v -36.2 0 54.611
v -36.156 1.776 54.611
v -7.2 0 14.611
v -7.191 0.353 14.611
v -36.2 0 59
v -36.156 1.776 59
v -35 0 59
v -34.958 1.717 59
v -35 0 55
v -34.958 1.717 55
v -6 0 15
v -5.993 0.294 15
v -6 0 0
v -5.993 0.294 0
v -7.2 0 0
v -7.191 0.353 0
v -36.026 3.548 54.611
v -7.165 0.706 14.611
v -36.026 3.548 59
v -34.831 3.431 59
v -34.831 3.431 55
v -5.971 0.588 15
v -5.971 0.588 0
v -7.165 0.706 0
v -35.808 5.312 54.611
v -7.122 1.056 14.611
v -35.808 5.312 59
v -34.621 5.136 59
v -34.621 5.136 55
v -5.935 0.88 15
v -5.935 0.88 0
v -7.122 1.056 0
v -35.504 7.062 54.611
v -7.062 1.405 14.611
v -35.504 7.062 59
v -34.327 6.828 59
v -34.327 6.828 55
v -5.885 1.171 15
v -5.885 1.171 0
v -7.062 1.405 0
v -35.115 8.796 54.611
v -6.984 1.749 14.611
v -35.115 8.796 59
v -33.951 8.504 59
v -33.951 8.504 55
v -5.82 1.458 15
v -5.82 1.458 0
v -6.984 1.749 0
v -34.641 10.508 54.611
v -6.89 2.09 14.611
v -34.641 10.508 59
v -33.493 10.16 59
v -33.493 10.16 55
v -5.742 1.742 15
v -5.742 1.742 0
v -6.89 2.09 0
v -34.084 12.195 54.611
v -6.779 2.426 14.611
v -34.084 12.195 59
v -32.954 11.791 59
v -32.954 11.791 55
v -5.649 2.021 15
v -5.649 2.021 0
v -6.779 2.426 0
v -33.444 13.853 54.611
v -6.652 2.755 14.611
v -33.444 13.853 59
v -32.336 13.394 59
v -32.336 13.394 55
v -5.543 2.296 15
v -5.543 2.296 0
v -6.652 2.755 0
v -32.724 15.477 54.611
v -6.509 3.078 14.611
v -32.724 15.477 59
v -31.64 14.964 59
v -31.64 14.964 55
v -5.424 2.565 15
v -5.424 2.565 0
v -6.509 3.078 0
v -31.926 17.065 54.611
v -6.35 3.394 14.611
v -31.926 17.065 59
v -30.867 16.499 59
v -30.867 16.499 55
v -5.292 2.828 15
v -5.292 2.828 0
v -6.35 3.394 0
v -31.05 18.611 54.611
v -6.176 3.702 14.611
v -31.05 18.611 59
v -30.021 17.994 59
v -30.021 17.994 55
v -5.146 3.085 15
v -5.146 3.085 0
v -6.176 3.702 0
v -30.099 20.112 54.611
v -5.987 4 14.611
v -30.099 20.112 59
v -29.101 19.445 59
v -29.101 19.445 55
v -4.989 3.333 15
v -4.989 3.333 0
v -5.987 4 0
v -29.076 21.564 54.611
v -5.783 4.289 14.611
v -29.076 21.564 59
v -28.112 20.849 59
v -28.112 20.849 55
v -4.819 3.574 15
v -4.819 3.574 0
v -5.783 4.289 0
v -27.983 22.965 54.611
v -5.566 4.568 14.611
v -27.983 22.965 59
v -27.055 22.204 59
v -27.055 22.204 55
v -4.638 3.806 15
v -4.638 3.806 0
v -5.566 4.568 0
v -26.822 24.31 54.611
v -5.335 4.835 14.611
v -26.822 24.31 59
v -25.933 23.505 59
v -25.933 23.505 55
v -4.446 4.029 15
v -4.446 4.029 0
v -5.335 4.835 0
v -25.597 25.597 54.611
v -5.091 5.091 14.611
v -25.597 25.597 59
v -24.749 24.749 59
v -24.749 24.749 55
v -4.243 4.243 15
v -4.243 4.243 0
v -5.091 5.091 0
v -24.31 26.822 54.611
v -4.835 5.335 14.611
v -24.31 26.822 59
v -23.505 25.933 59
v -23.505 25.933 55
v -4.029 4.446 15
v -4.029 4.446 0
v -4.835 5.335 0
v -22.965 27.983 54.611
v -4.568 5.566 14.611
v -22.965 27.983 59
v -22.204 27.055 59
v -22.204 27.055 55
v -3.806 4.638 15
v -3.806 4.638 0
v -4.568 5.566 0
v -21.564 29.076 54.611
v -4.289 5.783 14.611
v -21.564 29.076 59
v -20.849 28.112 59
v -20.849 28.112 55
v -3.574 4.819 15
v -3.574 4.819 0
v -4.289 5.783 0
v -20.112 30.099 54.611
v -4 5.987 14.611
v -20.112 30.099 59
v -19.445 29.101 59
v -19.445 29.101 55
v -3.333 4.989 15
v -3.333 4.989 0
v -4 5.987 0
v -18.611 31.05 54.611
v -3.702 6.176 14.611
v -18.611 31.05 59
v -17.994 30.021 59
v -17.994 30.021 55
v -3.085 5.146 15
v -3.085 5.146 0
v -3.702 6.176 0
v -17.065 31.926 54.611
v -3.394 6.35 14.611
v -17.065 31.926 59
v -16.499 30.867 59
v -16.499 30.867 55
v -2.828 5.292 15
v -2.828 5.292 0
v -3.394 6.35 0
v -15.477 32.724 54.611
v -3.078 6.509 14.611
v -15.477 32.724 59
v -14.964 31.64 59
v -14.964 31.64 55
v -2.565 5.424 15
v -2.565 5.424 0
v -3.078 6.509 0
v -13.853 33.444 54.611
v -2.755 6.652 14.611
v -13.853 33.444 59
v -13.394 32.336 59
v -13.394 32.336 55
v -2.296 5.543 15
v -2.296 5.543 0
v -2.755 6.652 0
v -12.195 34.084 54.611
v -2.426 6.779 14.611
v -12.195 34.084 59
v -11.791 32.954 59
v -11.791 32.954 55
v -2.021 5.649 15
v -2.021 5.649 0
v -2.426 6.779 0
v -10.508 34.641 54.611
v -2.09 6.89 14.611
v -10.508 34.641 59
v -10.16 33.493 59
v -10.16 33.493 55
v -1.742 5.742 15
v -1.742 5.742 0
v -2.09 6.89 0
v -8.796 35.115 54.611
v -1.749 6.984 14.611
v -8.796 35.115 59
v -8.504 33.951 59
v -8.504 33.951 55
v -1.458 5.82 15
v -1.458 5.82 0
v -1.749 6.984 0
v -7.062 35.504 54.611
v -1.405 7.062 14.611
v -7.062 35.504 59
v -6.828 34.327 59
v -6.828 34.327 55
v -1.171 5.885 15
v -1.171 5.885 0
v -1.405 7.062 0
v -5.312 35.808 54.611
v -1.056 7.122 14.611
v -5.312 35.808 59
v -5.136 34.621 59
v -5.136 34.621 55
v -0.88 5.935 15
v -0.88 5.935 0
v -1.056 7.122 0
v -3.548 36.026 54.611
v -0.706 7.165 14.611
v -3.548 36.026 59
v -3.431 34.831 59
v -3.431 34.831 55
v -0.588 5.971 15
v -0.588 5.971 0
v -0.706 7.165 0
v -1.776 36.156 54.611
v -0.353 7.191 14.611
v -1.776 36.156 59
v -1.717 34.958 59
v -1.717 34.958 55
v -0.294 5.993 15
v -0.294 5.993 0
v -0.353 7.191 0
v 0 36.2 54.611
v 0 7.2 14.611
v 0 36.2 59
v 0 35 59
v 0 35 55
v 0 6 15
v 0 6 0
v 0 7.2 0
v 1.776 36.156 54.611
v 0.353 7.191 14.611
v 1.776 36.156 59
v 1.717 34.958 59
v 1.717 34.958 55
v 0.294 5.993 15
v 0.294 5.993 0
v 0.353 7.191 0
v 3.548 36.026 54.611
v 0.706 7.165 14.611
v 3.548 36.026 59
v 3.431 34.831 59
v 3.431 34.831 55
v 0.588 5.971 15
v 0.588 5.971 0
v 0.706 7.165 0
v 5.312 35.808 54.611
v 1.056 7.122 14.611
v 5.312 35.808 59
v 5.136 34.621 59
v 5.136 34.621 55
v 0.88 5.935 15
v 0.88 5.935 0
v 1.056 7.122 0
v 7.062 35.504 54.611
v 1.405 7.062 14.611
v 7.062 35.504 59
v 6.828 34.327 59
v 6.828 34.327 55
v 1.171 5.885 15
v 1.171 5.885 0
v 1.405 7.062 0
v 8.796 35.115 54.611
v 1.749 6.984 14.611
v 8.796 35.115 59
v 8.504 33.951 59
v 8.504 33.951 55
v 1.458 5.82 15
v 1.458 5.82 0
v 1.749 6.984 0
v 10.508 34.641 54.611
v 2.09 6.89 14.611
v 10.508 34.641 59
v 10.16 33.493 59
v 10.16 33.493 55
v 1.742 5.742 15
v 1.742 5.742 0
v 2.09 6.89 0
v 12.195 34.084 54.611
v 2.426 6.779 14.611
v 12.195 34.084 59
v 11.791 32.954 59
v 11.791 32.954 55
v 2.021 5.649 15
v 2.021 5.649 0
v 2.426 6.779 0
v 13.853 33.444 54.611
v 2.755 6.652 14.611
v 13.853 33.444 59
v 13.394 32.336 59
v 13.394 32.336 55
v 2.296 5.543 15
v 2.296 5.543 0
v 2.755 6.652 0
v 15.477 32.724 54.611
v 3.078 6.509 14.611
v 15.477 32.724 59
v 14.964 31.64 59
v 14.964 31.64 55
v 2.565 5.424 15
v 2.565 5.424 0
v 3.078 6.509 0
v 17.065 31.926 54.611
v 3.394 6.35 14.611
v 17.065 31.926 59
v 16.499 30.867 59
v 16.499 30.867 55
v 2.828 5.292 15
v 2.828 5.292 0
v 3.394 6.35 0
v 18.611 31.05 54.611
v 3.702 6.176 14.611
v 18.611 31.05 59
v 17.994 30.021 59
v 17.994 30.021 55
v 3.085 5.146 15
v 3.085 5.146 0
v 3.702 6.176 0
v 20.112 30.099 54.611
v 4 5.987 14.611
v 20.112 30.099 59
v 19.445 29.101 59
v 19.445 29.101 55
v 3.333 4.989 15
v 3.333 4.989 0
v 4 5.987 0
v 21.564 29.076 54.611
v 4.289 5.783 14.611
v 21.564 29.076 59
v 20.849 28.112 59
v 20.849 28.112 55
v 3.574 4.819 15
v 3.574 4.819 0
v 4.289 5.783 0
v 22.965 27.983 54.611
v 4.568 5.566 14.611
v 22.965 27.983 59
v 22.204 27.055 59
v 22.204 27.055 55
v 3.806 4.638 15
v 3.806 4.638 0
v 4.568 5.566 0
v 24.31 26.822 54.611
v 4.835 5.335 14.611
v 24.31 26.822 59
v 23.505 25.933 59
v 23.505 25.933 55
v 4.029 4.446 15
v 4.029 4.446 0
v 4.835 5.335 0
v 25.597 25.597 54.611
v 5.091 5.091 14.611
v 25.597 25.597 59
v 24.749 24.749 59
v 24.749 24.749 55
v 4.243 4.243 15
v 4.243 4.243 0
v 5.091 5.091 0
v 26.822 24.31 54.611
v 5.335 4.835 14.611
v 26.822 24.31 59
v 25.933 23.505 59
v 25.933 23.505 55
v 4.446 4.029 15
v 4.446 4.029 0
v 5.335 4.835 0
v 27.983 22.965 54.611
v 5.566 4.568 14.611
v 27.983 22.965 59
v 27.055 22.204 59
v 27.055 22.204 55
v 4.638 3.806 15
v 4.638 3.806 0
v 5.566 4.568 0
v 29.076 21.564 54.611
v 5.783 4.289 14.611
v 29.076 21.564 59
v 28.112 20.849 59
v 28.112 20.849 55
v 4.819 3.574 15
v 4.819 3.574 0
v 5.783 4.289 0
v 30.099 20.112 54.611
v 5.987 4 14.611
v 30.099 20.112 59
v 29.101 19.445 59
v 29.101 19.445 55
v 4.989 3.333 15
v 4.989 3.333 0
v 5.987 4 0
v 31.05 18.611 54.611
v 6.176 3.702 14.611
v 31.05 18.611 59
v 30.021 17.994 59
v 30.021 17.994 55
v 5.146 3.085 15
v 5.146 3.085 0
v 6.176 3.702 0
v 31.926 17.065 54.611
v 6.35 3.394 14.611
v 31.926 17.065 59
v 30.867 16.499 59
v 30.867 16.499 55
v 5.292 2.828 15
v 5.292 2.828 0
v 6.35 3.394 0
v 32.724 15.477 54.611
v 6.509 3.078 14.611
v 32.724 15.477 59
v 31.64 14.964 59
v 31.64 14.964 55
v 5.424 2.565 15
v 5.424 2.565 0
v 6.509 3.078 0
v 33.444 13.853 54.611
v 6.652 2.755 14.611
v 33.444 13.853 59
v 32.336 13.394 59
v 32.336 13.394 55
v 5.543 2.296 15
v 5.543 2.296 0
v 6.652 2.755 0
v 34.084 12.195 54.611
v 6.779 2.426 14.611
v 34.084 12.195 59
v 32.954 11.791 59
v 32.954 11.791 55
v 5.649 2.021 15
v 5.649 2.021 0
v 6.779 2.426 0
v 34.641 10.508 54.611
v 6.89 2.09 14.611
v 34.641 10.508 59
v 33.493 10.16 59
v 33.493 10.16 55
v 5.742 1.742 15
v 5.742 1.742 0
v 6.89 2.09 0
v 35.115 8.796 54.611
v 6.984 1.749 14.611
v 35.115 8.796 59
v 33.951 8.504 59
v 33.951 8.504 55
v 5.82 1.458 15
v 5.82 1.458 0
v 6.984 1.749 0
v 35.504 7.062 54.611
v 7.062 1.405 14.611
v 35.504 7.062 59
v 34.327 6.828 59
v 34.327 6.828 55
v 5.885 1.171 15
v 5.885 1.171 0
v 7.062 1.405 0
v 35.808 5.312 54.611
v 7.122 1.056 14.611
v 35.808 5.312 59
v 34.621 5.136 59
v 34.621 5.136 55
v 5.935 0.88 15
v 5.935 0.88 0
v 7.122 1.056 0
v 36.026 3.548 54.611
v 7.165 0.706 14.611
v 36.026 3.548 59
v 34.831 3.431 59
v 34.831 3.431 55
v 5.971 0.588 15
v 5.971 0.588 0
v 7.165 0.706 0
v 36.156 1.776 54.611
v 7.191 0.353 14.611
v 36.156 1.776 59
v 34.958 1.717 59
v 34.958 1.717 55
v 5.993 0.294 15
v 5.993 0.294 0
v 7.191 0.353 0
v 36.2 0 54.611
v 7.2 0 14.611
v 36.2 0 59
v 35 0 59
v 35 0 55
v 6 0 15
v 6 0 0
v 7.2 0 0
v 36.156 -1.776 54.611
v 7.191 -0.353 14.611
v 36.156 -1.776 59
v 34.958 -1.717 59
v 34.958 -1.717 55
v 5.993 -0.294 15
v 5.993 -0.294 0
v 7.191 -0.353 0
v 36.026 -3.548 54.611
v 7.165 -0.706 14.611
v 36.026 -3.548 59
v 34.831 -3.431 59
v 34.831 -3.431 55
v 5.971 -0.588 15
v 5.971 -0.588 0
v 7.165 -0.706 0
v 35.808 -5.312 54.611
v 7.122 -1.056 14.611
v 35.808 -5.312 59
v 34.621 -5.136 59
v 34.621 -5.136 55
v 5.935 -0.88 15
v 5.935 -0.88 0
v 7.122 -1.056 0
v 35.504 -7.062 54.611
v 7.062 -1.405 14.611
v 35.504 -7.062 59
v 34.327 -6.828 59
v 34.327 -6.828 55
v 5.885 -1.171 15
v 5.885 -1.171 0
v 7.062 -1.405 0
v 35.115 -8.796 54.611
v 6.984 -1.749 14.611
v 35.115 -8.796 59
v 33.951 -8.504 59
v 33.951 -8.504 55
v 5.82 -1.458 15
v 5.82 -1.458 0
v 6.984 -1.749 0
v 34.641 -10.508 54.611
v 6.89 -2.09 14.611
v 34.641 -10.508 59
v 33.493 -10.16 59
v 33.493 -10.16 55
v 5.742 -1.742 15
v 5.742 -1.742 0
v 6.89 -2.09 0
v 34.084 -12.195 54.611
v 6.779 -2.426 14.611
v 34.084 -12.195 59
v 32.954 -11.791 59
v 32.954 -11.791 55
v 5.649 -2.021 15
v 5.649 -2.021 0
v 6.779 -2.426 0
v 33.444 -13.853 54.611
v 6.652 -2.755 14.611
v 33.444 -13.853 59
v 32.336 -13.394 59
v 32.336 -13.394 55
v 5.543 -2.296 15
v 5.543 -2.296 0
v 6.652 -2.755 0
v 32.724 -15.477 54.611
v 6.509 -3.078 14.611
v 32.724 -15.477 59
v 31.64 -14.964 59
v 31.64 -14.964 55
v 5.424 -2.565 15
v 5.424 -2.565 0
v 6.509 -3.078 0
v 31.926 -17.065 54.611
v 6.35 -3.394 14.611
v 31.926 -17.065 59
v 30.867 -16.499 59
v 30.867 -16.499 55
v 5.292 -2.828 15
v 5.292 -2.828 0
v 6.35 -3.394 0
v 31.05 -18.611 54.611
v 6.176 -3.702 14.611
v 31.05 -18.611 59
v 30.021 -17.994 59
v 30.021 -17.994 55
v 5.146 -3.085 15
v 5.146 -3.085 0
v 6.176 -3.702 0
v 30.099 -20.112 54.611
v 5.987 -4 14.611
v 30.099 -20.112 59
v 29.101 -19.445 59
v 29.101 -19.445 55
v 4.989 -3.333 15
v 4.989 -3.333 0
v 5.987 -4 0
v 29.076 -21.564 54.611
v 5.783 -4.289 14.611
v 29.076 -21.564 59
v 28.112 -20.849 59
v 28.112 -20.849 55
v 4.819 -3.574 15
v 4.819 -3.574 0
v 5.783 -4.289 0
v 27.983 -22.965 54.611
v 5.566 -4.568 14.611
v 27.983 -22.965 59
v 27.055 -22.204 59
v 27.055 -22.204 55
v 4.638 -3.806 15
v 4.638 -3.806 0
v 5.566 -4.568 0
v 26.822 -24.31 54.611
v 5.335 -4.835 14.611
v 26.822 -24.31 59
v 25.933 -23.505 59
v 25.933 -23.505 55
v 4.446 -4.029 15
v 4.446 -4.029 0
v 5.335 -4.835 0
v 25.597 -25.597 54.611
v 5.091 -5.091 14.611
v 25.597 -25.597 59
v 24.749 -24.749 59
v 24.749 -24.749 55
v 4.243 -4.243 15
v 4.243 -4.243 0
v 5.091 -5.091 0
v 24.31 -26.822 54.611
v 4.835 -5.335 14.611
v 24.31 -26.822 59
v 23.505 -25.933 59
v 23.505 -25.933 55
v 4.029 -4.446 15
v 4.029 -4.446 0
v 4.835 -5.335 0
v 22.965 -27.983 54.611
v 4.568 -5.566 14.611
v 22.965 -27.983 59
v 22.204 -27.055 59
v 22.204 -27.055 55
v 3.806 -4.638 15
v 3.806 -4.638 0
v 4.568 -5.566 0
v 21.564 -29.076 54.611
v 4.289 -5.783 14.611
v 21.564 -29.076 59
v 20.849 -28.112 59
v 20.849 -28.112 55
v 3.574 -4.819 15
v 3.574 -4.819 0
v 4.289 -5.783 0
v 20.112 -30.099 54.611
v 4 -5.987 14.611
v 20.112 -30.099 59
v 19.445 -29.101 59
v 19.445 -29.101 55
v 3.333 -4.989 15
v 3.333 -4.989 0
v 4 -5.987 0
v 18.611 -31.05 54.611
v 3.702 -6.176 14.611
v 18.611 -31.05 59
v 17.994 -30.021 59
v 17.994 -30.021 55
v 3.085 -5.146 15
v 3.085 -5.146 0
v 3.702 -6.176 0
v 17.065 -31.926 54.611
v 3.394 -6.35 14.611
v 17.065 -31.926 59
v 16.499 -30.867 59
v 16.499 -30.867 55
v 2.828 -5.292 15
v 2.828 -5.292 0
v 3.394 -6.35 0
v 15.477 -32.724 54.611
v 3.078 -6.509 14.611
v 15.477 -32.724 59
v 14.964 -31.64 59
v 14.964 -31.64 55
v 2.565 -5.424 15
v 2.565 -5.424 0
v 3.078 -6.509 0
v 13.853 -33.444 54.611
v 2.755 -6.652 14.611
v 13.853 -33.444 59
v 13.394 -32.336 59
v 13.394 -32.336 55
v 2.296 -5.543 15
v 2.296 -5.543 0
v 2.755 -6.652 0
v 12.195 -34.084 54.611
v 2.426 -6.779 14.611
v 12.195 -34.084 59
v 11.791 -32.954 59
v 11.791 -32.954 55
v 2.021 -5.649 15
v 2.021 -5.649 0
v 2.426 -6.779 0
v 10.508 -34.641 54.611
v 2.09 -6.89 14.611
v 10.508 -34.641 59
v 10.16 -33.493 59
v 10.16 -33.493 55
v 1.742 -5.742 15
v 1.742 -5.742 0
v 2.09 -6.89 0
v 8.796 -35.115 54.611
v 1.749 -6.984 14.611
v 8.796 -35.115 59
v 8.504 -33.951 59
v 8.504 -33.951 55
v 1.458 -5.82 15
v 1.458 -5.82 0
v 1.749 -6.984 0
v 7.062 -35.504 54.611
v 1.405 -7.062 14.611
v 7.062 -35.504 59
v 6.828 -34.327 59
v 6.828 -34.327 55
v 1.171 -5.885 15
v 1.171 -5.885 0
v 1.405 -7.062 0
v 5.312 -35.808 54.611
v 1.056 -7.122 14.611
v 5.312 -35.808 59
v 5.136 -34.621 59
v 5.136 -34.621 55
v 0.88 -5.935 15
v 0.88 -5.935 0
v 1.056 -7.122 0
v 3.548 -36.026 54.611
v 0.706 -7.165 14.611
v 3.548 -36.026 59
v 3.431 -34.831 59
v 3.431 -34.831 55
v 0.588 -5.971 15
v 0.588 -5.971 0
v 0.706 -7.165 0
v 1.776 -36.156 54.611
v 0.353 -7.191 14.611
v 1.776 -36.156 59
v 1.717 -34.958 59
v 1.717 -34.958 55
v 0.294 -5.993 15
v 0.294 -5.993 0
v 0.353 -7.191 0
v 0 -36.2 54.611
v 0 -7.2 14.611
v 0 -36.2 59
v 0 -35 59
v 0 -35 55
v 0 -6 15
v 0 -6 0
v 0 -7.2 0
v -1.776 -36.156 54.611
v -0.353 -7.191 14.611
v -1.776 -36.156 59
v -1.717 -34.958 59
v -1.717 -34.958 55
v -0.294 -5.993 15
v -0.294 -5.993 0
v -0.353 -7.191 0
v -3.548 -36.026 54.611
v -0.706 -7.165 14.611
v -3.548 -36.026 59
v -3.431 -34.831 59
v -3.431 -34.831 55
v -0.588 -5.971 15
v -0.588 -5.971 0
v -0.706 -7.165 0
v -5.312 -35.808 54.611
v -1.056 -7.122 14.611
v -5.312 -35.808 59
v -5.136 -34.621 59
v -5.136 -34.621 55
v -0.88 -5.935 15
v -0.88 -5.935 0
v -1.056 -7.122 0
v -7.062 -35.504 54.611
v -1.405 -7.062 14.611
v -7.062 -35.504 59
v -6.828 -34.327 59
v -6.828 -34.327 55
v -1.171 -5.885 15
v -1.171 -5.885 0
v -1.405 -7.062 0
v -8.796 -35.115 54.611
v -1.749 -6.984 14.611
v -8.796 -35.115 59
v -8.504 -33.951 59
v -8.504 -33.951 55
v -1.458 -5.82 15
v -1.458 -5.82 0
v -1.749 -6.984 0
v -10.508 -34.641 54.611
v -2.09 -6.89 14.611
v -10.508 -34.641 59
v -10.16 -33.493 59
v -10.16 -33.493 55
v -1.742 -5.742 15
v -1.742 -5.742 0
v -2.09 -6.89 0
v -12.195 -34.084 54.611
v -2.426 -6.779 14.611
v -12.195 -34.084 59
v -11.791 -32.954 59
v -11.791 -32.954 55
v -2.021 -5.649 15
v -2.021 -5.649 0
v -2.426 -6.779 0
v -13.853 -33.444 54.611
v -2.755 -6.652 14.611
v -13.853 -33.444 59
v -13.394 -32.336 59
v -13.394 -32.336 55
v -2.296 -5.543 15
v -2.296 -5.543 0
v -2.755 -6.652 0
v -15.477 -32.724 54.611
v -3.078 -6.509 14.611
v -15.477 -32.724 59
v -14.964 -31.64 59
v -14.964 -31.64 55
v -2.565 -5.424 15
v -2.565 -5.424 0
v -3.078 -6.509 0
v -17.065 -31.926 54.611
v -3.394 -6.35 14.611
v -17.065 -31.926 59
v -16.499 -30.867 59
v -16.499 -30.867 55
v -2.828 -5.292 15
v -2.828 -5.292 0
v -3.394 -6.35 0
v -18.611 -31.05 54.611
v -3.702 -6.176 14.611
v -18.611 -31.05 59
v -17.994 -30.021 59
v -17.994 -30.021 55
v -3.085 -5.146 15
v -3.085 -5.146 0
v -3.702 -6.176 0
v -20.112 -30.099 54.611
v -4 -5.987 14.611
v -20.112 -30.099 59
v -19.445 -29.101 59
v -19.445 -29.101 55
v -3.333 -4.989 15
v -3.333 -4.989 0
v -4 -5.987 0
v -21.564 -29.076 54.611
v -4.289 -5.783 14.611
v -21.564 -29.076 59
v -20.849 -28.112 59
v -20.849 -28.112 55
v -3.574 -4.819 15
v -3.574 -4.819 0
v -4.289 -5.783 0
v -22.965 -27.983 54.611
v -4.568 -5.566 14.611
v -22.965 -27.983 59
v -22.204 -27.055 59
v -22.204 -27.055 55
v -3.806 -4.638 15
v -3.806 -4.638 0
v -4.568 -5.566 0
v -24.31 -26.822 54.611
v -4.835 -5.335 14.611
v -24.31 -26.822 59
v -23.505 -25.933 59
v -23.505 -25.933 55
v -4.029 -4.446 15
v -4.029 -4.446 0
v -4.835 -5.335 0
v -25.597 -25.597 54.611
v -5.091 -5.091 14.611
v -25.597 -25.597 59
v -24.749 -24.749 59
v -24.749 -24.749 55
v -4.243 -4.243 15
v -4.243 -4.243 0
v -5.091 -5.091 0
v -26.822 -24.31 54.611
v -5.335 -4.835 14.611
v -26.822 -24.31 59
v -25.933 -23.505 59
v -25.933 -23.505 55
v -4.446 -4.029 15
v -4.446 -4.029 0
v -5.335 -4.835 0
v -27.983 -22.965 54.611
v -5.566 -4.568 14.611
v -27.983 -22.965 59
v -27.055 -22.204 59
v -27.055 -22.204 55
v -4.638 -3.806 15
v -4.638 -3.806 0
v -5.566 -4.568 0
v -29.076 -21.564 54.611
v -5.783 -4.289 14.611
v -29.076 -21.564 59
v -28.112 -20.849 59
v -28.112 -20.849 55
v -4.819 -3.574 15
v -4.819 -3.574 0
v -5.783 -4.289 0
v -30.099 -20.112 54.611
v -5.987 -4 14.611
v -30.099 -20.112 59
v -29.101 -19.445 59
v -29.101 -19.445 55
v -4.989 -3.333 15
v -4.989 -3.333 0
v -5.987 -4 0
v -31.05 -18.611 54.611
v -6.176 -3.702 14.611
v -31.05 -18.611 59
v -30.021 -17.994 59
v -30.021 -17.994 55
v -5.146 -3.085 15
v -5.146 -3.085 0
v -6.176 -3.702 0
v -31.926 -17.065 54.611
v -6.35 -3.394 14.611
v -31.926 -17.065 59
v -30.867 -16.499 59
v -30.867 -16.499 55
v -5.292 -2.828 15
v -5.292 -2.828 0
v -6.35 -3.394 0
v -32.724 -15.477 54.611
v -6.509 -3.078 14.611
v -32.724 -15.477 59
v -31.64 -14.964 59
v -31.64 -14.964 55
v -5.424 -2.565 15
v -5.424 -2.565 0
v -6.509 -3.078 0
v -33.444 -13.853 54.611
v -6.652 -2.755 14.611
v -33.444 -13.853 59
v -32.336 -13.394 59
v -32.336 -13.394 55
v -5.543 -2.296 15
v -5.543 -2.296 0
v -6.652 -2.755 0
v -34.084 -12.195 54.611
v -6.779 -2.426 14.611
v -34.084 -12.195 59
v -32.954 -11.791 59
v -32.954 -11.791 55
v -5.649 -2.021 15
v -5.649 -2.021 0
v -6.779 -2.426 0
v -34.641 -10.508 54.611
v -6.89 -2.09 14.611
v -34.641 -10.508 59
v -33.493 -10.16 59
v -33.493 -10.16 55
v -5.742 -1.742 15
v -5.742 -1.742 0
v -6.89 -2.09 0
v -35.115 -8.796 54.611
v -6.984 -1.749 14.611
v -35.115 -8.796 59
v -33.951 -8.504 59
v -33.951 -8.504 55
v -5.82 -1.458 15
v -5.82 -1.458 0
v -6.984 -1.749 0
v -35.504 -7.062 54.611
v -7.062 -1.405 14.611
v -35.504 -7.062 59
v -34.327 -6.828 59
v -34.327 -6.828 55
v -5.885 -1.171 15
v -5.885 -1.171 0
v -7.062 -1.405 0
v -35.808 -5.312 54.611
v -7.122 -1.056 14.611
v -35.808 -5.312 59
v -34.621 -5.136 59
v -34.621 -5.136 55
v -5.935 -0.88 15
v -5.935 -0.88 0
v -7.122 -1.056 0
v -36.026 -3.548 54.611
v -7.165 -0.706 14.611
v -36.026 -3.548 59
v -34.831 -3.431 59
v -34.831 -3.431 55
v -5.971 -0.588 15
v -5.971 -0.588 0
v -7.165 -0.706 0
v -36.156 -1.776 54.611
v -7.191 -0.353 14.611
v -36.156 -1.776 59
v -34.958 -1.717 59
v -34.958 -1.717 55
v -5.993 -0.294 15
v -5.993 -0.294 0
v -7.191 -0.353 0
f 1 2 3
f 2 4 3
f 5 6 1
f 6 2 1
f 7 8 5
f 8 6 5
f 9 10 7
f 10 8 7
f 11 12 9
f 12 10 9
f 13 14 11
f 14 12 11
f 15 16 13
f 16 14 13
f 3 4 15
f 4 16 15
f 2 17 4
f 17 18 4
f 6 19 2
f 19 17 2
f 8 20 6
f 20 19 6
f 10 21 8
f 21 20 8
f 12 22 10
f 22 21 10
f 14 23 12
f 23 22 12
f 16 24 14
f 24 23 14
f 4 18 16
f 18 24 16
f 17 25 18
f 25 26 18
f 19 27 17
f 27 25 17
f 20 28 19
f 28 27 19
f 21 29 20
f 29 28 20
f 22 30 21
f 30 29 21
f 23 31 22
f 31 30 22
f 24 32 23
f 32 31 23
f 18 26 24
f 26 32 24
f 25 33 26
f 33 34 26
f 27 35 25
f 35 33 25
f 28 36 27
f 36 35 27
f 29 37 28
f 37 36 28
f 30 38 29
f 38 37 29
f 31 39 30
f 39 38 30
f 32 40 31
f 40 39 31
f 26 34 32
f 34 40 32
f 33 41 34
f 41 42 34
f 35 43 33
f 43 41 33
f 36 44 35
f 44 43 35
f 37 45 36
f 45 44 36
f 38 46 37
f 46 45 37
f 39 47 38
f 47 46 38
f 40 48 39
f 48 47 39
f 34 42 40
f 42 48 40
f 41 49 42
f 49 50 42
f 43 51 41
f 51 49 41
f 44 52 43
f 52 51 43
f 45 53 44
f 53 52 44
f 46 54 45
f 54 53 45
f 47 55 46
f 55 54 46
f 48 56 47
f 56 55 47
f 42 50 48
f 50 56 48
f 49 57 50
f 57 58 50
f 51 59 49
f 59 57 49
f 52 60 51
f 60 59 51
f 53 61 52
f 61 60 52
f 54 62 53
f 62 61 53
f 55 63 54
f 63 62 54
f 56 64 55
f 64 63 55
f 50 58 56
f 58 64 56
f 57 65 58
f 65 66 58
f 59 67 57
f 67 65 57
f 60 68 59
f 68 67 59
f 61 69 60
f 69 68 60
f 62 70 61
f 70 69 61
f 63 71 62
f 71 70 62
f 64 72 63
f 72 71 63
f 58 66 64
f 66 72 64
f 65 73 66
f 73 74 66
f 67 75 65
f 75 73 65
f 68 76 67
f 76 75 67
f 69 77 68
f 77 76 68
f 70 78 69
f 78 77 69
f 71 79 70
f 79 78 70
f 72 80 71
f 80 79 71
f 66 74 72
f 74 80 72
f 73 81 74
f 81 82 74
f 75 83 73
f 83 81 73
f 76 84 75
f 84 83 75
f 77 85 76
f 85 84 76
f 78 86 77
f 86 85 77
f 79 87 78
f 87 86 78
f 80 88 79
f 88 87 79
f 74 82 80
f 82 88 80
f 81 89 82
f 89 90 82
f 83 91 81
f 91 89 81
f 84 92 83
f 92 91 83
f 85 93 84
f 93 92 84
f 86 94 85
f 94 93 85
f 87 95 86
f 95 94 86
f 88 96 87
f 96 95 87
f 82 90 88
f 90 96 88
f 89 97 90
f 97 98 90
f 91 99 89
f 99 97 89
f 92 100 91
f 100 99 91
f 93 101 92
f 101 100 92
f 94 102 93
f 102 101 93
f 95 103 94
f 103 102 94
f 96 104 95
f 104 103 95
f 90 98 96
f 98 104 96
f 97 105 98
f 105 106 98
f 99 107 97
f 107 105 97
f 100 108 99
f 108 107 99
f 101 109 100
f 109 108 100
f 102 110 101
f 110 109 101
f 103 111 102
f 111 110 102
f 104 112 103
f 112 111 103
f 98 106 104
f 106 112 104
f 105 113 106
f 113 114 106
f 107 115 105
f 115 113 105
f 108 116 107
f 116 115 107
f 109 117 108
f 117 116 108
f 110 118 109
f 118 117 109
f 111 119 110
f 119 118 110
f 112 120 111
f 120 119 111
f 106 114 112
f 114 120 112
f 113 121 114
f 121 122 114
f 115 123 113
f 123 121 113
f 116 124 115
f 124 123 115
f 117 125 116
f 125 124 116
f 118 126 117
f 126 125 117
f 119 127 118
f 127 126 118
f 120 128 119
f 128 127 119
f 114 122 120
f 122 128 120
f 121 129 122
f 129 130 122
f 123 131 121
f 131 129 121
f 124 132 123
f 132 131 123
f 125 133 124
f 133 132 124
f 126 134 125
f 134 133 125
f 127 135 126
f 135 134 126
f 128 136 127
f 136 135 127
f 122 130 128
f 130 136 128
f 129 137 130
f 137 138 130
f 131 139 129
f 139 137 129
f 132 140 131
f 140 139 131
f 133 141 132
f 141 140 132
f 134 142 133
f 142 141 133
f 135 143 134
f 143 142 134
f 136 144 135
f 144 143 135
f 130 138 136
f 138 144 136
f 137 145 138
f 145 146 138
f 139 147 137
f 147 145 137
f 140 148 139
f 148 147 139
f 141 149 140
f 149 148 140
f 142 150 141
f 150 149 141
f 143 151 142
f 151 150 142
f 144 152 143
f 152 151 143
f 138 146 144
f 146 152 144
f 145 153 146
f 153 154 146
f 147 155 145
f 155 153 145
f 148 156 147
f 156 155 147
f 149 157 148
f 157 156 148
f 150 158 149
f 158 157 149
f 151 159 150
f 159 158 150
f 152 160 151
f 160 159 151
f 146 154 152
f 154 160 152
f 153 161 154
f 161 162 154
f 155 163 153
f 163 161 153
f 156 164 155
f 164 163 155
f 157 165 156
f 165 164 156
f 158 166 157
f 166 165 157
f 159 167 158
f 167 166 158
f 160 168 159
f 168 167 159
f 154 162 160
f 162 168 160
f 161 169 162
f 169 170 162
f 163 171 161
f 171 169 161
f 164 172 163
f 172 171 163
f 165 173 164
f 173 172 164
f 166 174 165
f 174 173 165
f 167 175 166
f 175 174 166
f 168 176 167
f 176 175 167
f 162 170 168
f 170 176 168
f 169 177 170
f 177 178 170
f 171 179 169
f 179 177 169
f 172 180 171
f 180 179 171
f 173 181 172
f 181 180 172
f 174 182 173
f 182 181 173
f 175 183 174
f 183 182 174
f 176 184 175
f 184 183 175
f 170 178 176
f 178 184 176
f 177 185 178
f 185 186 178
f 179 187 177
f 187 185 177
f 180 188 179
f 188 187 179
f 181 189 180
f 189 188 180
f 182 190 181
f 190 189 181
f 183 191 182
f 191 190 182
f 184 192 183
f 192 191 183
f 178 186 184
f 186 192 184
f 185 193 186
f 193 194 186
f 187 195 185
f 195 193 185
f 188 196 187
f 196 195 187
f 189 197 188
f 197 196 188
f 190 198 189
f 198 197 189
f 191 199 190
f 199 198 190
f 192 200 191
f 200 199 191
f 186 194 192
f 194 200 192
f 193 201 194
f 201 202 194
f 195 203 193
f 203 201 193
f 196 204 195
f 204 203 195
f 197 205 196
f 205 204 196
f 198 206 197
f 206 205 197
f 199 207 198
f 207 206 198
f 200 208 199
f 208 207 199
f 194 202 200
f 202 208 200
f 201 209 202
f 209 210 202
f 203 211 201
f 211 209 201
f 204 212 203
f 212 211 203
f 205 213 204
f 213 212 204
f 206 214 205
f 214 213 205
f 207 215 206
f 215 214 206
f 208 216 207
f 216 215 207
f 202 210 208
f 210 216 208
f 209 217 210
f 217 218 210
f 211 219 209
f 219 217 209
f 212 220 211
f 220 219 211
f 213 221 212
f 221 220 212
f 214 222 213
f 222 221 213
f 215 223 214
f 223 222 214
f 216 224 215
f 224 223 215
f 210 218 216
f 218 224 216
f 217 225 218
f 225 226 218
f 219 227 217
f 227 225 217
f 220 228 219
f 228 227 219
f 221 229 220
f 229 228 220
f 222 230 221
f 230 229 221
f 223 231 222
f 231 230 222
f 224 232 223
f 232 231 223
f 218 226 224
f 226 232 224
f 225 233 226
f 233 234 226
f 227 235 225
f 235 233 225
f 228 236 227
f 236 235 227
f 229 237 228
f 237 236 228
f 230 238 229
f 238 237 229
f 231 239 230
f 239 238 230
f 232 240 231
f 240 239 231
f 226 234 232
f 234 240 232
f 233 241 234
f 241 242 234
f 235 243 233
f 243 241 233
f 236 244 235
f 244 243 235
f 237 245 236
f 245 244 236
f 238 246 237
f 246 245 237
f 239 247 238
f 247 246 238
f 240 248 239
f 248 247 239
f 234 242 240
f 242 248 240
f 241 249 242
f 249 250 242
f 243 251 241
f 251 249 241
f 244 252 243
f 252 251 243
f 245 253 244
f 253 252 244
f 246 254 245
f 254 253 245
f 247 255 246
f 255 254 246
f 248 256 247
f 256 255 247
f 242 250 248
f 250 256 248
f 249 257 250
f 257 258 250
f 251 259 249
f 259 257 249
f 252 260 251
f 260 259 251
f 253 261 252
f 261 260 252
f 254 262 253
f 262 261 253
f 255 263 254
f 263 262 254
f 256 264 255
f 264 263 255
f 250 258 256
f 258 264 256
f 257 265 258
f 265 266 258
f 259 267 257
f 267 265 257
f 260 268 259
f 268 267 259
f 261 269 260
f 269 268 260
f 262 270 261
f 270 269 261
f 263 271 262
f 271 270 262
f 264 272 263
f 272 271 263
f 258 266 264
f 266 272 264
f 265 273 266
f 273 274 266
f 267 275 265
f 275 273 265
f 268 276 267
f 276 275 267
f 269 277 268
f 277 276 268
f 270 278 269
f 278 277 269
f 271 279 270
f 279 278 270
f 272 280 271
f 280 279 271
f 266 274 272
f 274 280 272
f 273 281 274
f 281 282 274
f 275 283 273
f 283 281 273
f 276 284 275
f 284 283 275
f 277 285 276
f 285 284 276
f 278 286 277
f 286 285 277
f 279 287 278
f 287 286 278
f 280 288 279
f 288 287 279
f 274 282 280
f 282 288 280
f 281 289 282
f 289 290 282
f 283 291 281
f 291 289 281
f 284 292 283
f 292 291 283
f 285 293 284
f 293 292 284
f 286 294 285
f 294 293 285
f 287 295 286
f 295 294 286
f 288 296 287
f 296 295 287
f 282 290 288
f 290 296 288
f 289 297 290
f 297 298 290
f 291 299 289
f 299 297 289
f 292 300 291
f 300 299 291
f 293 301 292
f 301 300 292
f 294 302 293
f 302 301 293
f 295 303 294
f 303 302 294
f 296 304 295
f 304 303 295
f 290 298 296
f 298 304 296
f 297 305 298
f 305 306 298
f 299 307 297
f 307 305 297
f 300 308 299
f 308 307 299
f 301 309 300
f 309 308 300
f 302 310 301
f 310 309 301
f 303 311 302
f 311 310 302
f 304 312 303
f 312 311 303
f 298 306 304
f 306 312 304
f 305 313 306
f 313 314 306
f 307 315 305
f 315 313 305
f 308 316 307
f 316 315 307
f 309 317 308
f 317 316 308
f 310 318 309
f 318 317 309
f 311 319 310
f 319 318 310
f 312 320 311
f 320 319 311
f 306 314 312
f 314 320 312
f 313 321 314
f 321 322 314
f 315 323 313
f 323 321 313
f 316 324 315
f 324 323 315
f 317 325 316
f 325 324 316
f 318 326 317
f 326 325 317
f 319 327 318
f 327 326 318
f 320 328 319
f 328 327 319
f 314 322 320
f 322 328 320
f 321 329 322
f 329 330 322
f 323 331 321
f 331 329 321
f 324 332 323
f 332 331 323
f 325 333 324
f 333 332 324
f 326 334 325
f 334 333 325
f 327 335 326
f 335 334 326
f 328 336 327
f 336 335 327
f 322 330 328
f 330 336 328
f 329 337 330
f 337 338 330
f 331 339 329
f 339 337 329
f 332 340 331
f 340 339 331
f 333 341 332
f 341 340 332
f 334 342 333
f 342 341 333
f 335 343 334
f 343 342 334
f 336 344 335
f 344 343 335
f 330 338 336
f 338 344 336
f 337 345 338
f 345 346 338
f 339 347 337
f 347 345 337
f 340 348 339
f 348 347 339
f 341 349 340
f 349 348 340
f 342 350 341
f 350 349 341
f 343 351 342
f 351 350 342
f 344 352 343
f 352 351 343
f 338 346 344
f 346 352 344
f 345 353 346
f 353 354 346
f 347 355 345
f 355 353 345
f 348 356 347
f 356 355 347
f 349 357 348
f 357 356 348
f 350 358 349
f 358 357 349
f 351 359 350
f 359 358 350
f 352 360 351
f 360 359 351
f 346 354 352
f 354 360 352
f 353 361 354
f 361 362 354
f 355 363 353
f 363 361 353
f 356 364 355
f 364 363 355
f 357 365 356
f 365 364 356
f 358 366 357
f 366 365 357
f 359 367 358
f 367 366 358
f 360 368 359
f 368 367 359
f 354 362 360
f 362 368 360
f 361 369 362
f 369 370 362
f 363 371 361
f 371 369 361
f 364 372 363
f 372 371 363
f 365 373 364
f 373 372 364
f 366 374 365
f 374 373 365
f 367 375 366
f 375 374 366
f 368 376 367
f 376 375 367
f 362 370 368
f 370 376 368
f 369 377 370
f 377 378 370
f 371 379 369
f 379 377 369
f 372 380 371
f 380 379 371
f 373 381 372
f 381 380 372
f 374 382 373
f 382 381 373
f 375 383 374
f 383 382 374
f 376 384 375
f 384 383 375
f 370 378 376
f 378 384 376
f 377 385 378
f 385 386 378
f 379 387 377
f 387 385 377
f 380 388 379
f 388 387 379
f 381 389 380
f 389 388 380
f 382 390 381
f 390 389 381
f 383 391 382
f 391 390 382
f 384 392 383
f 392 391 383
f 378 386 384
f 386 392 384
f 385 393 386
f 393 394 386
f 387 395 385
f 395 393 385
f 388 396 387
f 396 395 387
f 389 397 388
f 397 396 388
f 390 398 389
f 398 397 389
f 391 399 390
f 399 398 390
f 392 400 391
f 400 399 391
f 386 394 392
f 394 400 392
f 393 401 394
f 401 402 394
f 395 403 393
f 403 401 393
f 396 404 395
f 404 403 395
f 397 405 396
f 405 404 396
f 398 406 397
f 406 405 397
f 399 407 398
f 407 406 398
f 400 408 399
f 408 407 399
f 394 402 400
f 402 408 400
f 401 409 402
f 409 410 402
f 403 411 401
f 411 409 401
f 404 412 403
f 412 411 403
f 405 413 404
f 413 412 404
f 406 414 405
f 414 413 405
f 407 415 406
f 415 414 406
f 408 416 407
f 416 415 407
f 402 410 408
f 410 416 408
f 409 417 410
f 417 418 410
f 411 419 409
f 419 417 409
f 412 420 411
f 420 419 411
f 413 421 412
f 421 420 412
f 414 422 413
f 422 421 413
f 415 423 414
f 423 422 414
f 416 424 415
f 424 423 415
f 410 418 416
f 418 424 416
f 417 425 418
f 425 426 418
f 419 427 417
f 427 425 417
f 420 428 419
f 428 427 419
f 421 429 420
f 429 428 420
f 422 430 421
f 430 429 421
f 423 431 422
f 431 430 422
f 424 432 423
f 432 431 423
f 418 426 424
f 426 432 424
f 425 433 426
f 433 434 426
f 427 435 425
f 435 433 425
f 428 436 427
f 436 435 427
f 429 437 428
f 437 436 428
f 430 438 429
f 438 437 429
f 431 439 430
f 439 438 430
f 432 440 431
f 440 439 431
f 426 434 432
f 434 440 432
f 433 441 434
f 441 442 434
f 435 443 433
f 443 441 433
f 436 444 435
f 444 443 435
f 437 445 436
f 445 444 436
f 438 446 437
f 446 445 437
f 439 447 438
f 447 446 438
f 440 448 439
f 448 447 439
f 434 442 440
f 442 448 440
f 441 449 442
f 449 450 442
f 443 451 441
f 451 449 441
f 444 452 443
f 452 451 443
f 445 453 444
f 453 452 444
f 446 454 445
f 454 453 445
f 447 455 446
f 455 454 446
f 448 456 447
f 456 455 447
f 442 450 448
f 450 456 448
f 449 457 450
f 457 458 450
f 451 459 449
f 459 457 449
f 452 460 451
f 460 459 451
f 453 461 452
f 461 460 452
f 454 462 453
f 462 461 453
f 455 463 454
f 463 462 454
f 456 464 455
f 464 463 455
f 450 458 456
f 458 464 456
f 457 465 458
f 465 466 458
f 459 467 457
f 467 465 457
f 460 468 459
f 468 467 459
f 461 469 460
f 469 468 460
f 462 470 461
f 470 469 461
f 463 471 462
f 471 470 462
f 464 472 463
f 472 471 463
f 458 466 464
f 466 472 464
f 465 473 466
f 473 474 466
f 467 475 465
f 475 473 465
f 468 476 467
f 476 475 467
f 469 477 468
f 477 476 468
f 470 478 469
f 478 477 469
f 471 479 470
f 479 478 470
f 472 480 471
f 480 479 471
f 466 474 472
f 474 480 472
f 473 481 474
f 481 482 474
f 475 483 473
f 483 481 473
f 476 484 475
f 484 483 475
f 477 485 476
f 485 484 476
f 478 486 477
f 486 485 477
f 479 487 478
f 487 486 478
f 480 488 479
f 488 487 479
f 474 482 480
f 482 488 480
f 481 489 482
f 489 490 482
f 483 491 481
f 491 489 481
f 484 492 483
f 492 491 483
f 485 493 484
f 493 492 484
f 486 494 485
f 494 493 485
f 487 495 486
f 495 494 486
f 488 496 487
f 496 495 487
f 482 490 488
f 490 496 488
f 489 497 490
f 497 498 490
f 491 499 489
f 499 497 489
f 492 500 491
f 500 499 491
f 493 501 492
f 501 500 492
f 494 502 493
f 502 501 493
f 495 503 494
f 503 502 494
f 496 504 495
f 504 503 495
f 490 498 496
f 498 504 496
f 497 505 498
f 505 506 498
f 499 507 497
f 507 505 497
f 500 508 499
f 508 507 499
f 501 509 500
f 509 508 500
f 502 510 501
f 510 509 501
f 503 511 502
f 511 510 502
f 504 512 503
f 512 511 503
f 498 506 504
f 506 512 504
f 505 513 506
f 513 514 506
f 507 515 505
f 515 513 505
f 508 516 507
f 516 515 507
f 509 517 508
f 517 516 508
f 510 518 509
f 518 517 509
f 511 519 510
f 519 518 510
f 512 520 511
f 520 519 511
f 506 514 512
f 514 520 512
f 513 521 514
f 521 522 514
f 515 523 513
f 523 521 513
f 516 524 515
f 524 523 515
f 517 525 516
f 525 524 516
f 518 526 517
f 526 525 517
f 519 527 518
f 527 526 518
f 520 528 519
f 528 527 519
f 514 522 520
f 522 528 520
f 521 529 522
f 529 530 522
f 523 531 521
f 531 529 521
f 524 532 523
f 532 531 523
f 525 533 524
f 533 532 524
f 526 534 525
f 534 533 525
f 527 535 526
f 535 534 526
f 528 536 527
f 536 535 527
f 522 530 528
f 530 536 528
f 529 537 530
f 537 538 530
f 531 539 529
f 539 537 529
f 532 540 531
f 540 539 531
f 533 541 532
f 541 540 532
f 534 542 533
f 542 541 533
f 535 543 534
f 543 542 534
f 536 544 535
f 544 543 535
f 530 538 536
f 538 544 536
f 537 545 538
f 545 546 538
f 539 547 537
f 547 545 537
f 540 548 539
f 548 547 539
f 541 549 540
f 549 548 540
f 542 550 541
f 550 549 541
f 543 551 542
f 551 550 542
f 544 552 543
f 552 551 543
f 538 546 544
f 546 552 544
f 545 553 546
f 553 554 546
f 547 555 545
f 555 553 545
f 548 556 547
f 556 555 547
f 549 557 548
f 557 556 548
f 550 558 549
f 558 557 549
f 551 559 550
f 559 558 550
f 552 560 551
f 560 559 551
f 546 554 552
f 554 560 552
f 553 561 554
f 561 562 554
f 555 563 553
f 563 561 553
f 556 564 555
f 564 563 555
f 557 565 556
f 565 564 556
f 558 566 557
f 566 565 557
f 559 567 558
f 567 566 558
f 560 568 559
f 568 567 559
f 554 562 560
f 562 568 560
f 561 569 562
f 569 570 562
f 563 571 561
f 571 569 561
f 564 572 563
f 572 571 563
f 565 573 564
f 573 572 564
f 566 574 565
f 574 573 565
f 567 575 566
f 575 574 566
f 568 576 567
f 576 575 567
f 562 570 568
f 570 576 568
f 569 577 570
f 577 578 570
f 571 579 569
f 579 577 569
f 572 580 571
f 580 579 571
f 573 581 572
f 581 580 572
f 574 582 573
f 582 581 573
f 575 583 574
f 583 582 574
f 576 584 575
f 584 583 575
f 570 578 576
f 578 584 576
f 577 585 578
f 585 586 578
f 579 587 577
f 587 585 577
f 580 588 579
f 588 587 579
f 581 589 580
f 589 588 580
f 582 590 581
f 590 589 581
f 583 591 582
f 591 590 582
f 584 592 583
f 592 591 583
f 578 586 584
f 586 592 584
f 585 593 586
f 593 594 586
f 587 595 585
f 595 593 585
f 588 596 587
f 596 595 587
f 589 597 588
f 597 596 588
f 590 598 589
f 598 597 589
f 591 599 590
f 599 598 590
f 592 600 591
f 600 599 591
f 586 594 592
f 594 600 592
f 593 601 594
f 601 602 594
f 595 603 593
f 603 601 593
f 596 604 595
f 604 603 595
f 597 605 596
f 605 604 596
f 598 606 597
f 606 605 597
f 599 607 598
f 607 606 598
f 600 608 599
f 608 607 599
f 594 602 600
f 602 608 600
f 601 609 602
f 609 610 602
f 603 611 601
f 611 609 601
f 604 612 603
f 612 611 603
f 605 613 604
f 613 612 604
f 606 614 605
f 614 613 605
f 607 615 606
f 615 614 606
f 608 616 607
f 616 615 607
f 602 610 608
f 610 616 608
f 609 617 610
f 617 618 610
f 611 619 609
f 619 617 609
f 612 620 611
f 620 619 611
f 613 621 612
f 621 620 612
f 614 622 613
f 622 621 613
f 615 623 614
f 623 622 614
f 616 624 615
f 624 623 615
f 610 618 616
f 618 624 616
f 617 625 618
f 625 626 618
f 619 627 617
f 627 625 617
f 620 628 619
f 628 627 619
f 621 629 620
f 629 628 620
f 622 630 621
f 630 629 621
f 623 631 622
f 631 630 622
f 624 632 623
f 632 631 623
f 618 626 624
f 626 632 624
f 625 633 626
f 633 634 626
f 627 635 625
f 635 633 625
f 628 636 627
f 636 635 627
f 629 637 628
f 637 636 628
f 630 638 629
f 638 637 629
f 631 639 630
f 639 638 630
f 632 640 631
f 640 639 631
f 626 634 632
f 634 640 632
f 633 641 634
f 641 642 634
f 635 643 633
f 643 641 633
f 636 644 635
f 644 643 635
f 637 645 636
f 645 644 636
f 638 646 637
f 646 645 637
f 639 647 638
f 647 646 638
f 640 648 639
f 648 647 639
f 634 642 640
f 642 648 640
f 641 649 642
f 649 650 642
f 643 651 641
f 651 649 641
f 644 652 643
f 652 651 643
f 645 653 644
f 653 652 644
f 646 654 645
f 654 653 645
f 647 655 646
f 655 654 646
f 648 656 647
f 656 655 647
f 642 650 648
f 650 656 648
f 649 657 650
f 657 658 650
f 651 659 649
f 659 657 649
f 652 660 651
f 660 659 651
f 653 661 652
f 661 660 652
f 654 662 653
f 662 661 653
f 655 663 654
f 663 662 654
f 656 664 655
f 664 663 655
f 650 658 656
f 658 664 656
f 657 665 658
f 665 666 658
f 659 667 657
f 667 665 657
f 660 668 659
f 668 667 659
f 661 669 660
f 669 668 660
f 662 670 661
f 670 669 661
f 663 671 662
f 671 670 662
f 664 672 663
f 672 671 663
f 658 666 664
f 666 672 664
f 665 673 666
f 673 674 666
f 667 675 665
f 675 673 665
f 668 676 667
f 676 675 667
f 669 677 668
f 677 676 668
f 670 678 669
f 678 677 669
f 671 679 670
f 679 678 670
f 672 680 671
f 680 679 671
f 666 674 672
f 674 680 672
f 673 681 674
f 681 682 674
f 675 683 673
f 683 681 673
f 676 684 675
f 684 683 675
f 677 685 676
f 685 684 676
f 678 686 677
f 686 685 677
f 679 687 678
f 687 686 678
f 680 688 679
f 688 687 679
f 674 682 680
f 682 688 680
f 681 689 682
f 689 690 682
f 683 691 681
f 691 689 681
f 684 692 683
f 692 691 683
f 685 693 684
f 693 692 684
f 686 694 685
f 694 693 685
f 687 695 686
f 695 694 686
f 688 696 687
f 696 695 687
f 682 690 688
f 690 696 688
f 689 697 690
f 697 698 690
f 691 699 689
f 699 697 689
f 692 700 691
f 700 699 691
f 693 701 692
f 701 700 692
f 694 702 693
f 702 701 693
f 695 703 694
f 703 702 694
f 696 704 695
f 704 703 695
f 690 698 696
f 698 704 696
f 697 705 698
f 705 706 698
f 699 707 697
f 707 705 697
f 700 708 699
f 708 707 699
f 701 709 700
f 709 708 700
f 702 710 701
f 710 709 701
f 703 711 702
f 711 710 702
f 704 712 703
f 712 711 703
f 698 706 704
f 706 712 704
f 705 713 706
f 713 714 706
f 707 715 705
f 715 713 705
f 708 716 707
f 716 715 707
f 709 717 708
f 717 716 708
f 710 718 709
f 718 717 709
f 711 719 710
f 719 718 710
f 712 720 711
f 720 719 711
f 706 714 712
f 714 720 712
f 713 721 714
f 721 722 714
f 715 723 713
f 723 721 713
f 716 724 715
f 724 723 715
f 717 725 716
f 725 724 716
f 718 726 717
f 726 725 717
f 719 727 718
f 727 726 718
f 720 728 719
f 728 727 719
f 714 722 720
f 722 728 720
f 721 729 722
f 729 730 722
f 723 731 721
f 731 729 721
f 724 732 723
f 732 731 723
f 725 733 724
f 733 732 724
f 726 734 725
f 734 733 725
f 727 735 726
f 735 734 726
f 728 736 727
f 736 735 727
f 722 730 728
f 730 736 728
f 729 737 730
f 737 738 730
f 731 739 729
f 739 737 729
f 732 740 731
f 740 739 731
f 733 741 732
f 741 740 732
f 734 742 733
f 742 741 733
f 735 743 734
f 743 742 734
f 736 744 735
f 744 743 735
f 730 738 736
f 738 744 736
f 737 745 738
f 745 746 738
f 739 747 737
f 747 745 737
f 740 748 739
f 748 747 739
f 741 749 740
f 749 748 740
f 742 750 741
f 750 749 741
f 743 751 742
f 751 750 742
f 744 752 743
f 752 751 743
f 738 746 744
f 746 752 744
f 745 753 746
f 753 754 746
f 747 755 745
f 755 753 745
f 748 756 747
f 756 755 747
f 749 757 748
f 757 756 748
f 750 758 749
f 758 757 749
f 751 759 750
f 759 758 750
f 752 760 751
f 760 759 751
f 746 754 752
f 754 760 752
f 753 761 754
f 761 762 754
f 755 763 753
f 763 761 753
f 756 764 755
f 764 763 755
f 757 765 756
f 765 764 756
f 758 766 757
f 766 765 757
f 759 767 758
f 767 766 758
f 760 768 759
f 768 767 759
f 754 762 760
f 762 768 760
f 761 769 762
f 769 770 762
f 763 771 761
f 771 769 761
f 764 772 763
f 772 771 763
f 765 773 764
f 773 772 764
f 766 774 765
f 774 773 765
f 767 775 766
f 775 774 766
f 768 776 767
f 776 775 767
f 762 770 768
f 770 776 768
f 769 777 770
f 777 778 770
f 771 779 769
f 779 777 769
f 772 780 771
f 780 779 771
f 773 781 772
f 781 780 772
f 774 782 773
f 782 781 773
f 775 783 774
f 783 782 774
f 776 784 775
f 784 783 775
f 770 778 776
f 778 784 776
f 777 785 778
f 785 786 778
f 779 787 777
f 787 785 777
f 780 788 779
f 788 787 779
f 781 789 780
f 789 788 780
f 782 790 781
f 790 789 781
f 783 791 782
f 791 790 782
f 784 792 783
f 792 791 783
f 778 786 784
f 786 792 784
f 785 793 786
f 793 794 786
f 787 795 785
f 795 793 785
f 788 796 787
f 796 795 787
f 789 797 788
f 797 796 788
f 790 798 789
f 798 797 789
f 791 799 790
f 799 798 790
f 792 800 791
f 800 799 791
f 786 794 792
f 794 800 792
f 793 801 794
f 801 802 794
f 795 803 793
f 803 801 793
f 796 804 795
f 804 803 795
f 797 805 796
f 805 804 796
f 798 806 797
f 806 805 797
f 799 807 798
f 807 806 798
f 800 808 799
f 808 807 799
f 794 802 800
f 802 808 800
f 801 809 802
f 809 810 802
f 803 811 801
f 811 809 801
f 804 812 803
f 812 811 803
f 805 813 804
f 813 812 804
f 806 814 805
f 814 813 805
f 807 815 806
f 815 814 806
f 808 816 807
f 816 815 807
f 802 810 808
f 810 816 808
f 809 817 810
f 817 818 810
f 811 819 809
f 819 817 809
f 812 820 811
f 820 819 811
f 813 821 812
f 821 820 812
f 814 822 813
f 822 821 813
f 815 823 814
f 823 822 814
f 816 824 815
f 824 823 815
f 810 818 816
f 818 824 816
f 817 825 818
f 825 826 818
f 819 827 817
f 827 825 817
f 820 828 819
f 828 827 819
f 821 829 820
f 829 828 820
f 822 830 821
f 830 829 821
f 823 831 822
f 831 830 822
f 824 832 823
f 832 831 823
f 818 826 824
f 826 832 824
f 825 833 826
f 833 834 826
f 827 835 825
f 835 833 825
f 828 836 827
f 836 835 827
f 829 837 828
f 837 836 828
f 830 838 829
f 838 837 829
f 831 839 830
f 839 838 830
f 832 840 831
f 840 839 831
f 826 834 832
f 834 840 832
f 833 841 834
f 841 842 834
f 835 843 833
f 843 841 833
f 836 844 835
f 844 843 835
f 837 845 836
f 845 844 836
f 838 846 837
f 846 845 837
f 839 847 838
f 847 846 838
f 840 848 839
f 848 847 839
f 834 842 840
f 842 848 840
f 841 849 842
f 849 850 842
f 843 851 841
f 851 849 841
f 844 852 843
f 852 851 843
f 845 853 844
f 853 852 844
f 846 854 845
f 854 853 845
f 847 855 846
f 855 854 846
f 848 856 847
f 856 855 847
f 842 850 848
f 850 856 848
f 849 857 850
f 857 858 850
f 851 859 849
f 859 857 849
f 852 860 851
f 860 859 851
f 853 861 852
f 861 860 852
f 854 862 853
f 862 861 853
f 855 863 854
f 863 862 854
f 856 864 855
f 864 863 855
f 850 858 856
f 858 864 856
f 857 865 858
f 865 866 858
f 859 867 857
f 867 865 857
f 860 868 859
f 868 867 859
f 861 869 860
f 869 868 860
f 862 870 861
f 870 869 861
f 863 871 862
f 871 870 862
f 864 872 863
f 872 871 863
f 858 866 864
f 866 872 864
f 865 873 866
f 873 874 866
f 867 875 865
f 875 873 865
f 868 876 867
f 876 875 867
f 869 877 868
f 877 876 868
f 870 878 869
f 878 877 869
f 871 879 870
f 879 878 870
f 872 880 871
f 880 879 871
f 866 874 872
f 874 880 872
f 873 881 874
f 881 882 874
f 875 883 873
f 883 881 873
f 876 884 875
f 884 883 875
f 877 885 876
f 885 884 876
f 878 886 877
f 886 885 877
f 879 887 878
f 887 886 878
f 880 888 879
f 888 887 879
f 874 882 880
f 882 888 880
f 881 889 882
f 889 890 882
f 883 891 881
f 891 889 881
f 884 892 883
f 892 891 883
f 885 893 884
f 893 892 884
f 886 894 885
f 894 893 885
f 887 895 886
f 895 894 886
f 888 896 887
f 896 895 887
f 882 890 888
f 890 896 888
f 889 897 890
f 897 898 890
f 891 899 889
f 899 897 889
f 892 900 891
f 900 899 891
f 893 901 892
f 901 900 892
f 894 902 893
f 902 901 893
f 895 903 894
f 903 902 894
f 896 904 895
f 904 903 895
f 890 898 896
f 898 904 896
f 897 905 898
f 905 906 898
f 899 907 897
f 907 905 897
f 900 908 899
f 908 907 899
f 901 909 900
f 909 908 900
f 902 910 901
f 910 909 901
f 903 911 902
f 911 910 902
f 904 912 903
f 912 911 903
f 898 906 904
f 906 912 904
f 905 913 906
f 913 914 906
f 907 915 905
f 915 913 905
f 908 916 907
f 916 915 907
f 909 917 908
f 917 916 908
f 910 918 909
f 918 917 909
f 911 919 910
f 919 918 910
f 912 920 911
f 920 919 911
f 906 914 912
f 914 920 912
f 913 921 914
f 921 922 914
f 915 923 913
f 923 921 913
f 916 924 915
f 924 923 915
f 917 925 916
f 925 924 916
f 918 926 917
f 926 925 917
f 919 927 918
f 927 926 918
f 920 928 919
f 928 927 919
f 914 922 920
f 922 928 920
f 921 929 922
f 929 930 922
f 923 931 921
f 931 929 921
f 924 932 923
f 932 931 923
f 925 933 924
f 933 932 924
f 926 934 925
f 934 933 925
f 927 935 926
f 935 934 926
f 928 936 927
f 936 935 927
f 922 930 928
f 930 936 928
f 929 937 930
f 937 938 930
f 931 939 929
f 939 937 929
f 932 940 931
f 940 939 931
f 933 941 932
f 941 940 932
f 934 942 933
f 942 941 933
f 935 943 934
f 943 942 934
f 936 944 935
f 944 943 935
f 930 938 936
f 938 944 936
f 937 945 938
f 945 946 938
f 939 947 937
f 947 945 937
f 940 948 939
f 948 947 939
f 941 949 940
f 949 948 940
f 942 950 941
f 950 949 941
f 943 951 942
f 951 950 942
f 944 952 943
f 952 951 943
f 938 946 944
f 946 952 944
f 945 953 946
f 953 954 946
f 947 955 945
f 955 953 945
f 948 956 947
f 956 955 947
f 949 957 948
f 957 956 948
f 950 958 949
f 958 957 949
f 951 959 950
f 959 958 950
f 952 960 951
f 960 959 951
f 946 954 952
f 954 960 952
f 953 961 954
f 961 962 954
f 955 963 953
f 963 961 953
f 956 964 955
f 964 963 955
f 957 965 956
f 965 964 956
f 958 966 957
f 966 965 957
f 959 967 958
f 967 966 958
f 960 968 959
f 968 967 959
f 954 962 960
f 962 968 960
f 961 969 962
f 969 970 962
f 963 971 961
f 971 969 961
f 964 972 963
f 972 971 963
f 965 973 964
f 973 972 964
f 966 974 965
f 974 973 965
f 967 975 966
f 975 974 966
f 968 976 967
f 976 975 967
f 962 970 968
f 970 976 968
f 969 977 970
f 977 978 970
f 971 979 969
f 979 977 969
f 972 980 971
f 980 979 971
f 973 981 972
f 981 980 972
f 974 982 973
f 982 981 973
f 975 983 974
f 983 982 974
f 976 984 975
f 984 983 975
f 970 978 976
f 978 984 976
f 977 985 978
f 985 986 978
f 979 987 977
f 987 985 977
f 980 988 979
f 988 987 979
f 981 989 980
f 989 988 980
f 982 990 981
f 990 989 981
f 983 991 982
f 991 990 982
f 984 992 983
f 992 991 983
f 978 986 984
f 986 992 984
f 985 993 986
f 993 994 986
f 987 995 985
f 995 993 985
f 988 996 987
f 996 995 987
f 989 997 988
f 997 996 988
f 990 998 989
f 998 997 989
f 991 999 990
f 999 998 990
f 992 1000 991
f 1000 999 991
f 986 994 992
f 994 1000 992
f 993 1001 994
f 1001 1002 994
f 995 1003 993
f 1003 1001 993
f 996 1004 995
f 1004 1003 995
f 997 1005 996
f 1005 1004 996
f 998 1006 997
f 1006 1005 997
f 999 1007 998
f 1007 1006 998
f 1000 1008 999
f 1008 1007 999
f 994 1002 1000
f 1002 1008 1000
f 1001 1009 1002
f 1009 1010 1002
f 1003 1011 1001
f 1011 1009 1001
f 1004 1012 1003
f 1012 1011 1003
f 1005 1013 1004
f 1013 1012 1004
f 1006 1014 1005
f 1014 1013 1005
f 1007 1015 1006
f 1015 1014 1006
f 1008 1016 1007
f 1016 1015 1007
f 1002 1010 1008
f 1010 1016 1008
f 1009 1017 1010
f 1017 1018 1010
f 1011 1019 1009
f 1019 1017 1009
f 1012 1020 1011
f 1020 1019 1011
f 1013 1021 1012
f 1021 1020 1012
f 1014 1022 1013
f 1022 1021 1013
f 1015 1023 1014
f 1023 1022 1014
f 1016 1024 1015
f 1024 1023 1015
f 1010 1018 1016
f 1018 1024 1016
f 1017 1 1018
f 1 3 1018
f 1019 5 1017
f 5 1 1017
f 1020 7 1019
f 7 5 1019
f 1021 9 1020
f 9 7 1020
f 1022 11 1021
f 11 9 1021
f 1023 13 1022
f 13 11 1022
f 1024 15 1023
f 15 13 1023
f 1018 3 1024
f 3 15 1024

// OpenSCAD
// file: ../funnel.scad
/**
 * @file funnel.scad
 * @brief Generate a funnel shape using the given parameters.
 * @author Cameron K. Brooks
 * @copyright 2025
 *
 * This file contains modules for generating a funnel shape using the given parameters.
 * Uses polygon() and rotate_extrude() to create the funnel shape in an efficient manner.
 *
 */

/* [Funnel] */
// Height of the cone (mm)
funnel_height = 60; // [10:1:200]
// Inside radius at the top of the cone (mm)
funnel_top_radius = 50; // [10:1:150]
// Height of the straight throat below the cone (mm)
throat_height = 20; // [5:1:100]
// Inside radius of the throat (mm)
throat_radius = 15; // [2:0.5:60]
// Wall thickness, square to the wall (mm)
wall_thickness = 0.8; // [0.4:0.1:4]
// Height of the straight rim above the cone (mm)
top_edge_height = 5; // [0:1:30]

funnel(
    funnel_height=funnel_height, funnel_top_radius=funnel_top_radius, throat_height=throat_height,
    throat_radius=throat_radius, wall_thickness=wall_thickness, top_edge_height=top_edge_height
);

/*
 * @brief Generate a funnel shape using the given parameters.
 *
 * @param funnel_height Height of the funnel section.
 * @param funnel_top_radius Inner radius of the funnel's top.
 * @param throat_height Vertical height of the throat section.
 * @param throat_radius Inner radius of the throat.
 * @param wall_thickness Thickness of the funnel wall, measured square to the wall.
 * @param top_edge_height Additional height at the funnel's top edge.
 * @param smoothness_segments Number of segments for a smooth rotation.
 */
module funnel(
    funnel_height,
    funnel_top_radius,
    throat_height,
    throat_radius,
    wall_thickness,
    top_edge_height,
    smoothness_segments = 128
) {
    rotate_extrude($fn=smoothness_segments)
        polygon(
            funnel_profile(
                funnel_height, funnel_top_radius, throat_height, throat_radius, wall_thickness,
                top_edge_height
            )
        );
}

/*
 * @brief The funnel's cross-section as [radius, height] points, inside wall
 * first from the bottom of the throat to the top edge, then back down the
 * outside.
 *
 * The outside of the sloped section is parallel to the inside and
 * wall_thickness away from it, so its corners sit below the inside ones by
 * wall_thickness * (slope length - funnel_height) / (top radius - throat radius).
 */
function funnel_profile(
    funnel_height,
    funnel_top_radius,
    throat_height,
    throat_radius,
    wall_thickness,
    top_edge_height
) =
    let (
        run = funnel_top_radius - throat_radius,
        slope = norm([run, funnel_height]),
        drop = wall_thickness * (slope - funnel_height) / run,
        top = throat_height + funnel_height + top_edge_height
    )
    assert(run > 0, "funnel_top_radius must be larger than throat_radius")
    assert(
        drop < throat_height, str(
            "throat_height must be more than ", drop,
            " mm, or the outside of the slope runs below the throat"
        )
    )
    [
        [throat_radius, 0],
        [throat_radius, throat_height],
        [funnel_top_radius, throat_height + funnel_height],
        [funnel_top_radius, top],
        [funnel_top_radius + wall_thickness, top],
        [funnel_top_radius + wall_thickness, throat_height + funnel_height - drop],
        [throat_radius + wall_thickness, throat_height - drop],
        [throat_radius + wall_thickness, 0],
    ];
// main file
// A small funnel for filling bottles, called from another file.
use <../funnel.scad>

funnel(
    funnel_height=40, funnel_top_radius=35, throat_height=15,
    throat_radius=6, wall_thickness=1.2, top_edge_height=4
);
